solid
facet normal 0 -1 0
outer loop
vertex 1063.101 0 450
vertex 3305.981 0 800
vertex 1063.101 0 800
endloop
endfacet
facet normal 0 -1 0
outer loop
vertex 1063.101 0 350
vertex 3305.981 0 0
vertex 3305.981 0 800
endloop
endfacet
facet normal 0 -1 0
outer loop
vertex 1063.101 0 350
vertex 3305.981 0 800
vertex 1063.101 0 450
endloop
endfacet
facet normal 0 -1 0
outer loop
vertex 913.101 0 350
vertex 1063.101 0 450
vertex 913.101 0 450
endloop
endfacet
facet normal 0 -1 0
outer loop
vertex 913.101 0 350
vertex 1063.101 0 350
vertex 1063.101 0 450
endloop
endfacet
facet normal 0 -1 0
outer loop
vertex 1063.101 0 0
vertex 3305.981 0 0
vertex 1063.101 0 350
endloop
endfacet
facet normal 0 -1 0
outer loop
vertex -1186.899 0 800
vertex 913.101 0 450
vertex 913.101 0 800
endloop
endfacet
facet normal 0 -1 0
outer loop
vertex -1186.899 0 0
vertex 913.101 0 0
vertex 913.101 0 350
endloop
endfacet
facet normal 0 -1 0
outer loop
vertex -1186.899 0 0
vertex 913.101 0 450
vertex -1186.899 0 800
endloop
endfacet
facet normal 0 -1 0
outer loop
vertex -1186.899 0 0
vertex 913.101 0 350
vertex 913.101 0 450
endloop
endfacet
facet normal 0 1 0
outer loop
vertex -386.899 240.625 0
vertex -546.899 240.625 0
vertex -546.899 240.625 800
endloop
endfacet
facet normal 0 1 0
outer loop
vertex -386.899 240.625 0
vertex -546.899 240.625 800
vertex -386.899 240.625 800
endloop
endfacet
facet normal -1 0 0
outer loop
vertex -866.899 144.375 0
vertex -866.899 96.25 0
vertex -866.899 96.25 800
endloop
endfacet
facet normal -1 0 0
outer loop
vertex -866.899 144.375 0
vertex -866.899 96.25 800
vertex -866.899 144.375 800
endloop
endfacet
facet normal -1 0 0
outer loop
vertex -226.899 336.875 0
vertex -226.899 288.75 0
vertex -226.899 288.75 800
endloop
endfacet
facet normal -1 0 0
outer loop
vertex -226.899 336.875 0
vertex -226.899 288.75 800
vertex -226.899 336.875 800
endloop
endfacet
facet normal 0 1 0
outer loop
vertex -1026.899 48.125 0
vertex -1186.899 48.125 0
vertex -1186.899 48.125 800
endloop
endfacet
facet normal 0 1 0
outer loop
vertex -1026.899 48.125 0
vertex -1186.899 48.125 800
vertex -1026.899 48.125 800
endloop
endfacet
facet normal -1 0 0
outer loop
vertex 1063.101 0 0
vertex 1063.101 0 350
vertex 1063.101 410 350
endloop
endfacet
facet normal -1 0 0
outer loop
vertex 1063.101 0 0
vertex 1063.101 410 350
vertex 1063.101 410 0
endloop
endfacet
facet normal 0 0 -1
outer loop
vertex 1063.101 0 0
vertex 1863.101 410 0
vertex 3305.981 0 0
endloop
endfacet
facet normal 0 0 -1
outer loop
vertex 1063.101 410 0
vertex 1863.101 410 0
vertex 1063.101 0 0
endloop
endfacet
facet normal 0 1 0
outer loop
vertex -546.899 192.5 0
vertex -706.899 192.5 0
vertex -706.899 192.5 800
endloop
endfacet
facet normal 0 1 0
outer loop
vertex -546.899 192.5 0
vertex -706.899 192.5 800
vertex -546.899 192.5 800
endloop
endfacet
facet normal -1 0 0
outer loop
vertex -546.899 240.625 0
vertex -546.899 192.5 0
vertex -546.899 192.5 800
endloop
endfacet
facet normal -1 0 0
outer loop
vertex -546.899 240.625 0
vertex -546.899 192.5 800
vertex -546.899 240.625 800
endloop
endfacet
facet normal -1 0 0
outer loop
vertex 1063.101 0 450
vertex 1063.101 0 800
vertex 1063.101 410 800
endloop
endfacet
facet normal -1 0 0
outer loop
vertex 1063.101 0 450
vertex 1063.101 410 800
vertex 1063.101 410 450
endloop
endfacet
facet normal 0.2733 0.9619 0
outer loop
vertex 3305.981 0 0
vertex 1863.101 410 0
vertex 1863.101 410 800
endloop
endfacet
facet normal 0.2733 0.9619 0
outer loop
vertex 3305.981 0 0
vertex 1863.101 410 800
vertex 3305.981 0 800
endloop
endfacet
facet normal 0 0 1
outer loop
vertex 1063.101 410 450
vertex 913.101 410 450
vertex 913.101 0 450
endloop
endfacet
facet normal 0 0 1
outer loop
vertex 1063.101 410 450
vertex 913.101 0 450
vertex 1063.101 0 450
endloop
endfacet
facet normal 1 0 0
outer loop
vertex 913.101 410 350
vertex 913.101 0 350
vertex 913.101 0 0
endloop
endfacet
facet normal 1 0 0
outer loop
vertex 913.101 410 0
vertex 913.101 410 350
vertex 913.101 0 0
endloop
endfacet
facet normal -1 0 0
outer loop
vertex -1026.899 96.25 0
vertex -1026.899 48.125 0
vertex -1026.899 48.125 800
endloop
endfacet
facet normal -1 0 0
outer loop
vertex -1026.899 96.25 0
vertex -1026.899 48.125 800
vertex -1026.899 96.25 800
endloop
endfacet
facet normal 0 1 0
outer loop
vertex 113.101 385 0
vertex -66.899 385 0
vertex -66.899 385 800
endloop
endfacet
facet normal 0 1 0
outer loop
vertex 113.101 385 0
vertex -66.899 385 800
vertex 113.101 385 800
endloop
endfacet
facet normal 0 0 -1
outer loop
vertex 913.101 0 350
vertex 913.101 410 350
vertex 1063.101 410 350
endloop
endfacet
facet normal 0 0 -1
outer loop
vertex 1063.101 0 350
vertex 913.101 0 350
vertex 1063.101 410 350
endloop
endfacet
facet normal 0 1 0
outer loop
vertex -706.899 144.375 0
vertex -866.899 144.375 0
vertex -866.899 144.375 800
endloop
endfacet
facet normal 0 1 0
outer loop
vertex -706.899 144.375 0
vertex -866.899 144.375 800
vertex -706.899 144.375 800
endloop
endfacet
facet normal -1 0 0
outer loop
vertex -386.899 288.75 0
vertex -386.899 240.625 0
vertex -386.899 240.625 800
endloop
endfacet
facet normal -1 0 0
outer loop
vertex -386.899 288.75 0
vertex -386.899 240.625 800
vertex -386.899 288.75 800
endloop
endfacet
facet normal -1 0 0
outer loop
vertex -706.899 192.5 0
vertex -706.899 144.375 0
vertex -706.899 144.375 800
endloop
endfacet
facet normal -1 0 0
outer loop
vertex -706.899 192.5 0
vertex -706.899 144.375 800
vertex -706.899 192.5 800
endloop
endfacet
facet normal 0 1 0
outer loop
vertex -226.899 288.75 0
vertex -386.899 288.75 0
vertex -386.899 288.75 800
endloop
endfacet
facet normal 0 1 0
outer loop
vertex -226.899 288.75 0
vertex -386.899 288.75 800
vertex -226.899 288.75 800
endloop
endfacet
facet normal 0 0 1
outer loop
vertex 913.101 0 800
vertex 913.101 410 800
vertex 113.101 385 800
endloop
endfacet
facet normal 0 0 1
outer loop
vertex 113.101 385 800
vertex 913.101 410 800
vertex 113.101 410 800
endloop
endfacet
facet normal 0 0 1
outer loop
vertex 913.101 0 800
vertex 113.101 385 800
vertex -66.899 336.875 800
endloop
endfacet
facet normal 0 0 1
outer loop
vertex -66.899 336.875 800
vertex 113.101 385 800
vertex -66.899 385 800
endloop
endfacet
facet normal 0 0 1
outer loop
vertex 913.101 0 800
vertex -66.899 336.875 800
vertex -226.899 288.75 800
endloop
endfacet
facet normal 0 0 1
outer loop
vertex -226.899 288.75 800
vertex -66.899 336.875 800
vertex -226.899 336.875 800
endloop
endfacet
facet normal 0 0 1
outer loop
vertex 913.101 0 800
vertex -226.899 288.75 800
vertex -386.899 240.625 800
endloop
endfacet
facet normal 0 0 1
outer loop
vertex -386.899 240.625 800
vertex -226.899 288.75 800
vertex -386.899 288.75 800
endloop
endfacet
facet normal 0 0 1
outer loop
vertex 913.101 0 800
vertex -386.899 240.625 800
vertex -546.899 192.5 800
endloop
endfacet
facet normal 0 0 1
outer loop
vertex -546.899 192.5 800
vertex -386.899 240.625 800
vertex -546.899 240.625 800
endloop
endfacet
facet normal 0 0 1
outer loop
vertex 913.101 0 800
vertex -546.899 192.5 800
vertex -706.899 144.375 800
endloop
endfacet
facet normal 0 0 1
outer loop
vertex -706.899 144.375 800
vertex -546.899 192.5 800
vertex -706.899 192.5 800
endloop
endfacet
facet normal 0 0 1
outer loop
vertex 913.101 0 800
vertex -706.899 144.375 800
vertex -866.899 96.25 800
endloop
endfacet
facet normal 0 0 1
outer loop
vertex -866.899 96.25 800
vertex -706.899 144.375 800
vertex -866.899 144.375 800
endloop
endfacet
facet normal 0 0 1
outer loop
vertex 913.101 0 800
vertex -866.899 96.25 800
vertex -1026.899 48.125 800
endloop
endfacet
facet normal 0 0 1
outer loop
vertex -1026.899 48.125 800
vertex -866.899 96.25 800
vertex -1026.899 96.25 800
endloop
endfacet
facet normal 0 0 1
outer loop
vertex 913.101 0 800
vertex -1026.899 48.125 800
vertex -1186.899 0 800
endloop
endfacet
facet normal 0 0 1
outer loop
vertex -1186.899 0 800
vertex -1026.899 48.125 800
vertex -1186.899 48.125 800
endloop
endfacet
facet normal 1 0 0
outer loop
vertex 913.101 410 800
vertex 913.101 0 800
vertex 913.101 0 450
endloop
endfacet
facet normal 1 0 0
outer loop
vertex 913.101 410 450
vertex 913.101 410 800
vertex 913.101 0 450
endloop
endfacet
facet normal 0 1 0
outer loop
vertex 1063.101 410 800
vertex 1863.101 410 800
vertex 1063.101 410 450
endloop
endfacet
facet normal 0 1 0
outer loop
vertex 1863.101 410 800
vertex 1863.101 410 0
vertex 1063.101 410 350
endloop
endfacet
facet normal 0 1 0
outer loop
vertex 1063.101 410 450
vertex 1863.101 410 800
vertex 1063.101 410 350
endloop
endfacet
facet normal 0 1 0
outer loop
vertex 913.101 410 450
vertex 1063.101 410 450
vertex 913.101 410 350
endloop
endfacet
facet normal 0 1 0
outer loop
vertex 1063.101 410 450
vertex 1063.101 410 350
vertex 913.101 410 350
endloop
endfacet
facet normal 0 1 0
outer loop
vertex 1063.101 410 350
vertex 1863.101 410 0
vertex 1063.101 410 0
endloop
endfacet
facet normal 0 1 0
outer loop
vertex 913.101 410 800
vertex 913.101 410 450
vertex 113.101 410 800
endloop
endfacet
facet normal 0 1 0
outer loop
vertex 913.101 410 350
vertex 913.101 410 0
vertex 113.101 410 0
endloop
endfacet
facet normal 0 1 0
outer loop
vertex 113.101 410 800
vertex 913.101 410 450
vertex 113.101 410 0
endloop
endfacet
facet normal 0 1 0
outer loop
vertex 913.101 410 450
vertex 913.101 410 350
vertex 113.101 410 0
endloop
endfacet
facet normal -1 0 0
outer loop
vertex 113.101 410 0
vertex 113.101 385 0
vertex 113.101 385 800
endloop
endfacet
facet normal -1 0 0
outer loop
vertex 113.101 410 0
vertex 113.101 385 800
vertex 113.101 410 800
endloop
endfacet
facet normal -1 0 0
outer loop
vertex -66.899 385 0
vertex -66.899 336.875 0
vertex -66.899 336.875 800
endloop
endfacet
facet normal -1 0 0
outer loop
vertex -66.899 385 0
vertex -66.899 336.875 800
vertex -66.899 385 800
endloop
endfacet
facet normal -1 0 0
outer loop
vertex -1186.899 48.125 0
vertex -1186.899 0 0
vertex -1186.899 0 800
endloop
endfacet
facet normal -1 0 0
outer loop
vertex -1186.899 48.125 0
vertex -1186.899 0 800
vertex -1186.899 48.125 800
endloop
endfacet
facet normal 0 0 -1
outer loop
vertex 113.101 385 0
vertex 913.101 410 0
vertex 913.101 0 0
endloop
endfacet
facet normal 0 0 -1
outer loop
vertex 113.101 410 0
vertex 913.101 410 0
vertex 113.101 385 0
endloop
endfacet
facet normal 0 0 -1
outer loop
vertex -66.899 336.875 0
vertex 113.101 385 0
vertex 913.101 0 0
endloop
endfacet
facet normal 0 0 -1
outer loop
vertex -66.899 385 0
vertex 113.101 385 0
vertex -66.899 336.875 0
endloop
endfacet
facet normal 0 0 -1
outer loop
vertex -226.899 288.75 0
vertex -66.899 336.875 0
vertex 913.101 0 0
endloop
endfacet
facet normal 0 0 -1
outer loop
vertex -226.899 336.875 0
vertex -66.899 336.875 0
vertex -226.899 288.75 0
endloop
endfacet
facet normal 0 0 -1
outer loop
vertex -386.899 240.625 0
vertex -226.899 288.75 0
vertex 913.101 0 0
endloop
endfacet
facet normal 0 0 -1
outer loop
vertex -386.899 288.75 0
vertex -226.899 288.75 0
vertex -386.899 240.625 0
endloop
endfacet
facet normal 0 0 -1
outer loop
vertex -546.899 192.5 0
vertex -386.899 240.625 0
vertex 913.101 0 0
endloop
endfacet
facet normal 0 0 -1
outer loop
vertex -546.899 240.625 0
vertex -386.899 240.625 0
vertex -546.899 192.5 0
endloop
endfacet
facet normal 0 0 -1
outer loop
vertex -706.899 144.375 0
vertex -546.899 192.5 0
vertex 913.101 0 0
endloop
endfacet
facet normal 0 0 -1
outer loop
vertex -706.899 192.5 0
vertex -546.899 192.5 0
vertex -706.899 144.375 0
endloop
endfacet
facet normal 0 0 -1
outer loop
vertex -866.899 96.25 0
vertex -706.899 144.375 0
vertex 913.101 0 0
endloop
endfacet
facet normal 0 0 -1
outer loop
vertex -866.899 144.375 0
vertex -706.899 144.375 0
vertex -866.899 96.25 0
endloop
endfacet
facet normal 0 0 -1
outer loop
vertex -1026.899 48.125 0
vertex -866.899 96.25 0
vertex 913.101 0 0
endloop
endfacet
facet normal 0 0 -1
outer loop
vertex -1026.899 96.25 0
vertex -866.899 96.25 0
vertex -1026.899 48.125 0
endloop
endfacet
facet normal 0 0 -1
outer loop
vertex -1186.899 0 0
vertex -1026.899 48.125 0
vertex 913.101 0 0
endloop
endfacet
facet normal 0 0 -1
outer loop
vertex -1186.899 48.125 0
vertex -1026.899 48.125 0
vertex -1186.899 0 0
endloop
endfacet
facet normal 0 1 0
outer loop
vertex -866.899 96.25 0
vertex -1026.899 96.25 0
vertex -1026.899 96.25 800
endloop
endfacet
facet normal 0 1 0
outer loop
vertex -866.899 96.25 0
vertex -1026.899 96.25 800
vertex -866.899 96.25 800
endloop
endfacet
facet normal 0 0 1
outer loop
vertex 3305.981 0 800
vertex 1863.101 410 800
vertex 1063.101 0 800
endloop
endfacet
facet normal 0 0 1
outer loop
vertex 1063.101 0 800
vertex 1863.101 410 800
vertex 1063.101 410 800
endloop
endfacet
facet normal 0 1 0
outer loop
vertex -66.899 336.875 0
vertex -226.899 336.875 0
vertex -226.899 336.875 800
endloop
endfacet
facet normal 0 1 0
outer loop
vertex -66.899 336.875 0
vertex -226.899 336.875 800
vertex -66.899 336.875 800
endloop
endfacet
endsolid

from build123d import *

# Parameters (mm, degrees)
BOSS_EXTRUDE1_DEPTH = 800
SKETCH3_W           = 150
SKETCH3_H           = 350
CUT_EXTRUDE1_DEPTH  = 800


with BuildPart() as part:
    # Sketch1 → Boss-Extrude1 (new body)
    with BuildSketch(Plane.XY):
        Polygon((-1186.898547427, 48.125), (-1026.898547427, 48.125), (-1026.898547427, 96.25), (-866.898547427, 96.25), (-866.898547427, 144.375), (-706.898547427, 144.375), (-706.898547427, 192.5), (-546.898547427, 192.5), (-546.898547427, 240.625), (-386.898547427, 240.625), (-386.898547427, 288.75), (-226.898547427, 288.75), (-226.898547427, 336.875), (-66.898547427, 336.875), (-66.898547427, 385), (113.101452573, 385), (113.101452573, 410), (913.101452573, 410), (1063.101452573, 410), (1863.101452573, 410), (3305.980518884, 0), (-1186.898547427, 0), align=None)
    extrude(amount=BOSS_EXTRUDE1_DEPTH)

    # Sketch3 → Cut-Extrude1 (cut)
    with BuildSketch(Plane(origin=(0, 410, 0), x_dir=(1, 0, 0), z_dir=(0, 1, 0))):
        with Locations((988.101452573, -175)):
            Rectangle(SKETCH3_W, SKETCH3_H)
        with Locations((988.101452573, -625)):
            Rectangle(SKETCH3_W, SKETCH3_H)
    extrude(amount=-CUT_EXTRUDE1_DEPTH, mode=Mode.SUBTRACT)


solid = part.part
